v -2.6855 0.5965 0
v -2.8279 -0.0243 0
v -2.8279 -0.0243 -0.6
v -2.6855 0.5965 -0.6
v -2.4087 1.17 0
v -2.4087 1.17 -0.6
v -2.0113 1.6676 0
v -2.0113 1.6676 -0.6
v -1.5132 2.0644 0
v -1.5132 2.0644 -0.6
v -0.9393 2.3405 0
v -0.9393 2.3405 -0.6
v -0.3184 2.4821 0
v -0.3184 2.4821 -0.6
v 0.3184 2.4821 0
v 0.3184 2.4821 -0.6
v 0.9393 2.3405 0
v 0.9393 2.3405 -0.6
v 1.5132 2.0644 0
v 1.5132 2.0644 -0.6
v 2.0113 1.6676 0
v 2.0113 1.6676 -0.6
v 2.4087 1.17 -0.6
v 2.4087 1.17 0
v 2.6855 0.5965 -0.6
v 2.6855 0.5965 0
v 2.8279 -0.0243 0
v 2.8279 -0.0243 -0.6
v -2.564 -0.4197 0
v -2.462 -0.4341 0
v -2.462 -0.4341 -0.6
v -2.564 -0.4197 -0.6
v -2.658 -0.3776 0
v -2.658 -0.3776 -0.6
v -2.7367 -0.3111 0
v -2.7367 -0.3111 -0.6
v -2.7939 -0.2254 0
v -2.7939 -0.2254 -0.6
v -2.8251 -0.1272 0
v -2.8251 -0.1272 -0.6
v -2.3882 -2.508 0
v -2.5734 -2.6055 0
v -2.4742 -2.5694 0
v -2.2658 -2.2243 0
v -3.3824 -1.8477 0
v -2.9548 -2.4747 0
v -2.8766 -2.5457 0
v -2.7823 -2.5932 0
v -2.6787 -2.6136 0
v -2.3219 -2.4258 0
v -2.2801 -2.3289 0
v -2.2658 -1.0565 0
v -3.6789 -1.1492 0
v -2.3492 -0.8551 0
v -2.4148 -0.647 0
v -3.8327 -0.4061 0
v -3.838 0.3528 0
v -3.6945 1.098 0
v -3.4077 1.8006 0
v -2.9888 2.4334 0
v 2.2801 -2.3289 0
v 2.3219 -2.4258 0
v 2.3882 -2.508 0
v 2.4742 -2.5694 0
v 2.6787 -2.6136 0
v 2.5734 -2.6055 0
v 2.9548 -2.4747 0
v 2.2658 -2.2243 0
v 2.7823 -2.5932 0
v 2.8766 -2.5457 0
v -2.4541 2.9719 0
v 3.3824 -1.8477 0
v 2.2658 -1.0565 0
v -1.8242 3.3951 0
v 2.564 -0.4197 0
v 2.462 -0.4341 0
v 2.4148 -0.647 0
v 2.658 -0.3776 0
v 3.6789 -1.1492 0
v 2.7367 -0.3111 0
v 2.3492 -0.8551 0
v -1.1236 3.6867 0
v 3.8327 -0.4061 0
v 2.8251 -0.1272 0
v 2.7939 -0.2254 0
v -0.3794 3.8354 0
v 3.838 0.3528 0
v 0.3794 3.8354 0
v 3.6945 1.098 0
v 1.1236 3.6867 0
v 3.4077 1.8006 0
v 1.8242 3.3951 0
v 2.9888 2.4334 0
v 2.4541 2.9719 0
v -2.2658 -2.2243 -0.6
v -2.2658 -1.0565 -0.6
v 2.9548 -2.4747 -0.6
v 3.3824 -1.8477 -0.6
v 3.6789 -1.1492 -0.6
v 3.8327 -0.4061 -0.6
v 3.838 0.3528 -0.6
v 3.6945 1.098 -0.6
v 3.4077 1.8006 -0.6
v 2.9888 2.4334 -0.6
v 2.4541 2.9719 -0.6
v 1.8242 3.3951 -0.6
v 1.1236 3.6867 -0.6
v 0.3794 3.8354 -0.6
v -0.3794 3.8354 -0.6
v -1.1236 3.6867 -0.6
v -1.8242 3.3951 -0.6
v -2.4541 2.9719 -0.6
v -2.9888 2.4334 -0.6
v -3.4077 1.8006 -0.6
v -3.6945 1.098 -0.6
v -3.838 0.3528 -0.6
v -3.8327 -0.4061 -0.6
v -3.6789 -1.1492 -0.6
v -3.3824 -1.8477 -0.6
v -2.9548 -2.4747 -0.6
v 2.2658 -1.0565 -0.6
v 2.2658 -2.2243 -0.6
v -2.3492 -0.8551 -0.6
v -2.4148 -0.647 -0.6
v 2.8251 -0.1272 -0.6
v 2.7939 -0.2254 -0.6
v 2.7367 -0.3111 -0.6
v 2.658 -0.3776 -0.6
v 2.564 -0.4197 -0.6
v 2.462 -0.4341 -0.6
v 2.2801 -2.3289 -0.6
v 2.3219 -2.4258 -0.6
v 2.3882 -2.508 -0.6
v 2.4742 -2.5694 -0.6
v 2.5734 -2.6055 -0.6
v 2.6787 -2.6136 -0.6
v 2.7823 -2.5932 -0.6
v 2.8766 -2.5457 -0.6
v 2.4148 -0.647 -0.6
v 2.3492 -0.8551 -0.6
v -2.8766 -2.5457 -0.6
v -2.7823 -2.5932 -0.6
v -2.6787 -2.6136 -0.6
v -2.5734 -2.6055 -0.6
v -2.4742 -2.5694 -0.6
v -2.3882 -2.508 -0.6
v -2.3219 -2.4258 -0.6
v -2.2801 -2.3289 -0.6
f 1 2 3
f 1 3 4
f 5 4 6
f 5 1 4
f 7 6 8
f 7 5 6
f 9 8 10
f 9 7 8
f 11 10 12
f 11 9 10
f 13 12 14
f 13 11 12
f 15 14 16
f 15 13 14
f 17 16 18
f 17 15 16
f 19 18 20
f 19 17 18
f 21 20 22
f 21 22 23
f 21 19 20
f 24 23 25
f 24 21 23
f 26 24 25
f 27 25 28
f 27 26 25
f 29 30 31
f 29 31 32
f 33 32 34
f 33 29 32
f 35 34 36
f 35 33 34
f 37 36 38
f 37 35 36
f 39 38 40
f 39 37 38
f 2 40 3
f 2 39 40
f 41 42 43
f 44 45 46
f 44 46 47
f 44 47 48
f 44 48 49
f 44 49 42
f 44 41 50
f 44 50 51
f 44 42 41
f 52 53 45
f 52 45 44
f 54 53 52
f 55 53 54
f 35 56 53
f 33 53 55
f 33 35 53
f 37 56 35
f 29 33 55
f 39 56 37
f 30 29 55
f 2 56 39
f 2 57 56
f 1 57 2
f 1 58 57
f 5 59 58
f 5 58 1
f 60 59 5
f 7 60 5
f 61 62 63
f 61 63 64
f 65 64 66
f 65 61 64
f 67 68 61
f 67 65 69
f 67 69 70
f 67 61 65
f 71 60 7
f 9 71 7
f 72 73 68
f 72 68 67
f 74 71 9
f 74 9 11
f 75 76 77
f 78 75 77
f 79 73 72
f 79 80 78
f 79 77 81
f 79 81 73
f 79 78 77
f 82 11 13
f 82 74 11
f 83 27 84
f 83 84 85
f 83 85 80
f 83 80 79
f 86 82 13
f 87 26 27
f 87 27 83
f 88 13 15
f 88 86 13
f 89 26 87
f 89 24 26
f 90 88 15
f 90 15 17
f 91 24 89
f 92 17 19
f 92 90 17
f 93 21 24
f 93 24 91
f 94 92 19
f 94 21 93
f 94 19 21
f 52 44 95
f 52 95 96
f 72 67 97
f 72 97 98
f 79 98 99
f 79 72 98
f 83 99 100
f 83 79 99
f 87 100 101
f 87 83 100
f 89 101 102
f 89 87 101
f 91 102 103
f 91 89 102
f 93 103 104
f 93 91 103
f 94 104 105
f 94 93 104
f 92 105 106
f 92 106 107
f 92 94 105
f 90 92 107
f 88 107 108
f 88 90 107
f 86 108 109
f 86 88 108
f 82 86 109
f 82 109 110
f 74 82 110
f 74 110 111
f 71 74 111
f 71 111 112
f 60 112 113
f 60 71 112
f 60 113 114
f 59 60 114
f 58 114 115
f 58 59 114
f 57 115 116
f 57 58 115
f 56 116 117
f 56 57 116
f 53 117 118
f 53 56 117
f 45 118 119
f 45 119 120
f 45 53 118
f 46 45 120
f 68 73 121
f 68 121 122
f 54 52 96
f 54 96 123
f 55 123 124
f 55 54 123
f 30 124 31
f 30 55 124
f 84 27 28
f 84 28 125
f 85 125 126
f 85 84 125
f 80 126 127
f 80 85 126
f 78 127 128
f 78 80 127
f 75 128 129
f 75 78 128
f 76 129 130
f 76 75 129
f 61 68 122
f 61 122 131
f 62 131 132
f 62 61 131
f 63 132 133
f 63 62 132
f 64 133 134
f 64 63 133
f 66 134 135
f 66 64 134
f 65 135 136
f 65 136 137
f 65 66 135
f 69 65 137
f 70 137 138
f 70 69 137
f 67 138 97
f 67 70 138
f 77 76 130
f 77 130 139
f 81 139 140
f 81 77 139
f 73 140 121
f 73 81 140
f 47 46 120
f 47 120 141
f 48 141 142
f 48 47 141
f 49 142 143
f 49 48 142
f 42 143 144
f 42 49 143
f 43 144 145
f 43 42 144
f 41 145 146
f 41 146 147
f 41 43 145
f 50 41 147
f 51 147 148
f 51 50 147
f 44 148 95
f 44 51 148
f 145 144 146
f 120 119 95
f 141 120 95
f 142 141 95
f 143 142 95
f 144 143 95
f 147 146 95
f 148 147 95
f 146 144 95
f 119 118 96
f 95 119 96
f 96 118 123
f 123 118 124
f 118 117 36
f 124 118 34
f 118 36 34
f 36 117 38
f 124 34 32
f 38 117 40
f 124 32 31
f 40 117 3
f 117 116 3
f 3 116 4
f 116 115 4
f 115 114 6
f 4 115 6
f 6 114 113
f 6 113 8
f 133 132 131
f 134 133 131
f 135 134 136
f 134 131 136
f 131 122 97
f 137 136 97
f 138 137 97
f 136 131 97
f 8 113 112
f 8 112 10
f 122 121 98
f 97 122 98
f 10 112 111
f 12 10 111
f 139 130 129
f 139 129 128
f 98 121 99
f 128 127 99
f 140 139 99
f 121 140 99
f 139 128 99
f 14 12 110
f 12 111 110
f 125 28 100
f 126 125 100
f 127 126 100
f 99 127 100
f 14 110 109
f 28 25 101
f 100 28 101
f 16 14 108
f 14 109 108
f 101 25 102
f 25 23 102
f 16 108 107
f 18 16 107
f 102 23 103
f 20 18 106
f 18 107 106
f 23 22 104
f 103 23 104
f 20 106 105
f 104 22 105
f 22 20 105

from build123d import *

# Parameters (mm, degrees)
BODY_DEPTH = 0.6


with BuildPart() as part:
    # BodySke → Body (new body)
    with BuildSketch(Plane.XY):
        with BuildLine():
            Line((2.265769468, -1.056545654), (2.265769468, -2.224261502))
            ThreePointArc((2.265769468, -2.224261502), (2.522551556, -2.590803434), (2.95475915, -2.474671505))
            ThreePointArc((2.95475915, -2.474671505), (0, 3.854166667), (-2.95475915, -2.474671505))
            ThreePointArc((-2.95475915, -2.474671505), (-2.522551556, -2.590803434), (-2.265769468, -2.224261502))
            Line((-2.265769468, -2.224261502), (-2.265769468, -1.056545654))
            ThreePointArc((-2.265769468, -1.056545654), (-2.384292377, -0.751764499), (-2.462019383, -0.434120444))
            ThreePointArc((-2.462019383, -0.434120444), (-2.736711011, -0.311110876), (-2.82786799, -0.024270764))
            ThreePointArc((-2.82786799, -0.024270764), (0, 2.5), (2.82786799, -0.024270764))
            ThreePointArc((2.82786799, -0.024270764), (2.736711011, -0.311110876), (2.462019383, -0.434120444))
            ThreePointArc((2.462019383, -0.434120444), (2.384292377, -0.751764499), (2.265769468, -1.056545654))
        make_face()
    extrude(amount=-BODY_DEPTH)


solid = part.part
